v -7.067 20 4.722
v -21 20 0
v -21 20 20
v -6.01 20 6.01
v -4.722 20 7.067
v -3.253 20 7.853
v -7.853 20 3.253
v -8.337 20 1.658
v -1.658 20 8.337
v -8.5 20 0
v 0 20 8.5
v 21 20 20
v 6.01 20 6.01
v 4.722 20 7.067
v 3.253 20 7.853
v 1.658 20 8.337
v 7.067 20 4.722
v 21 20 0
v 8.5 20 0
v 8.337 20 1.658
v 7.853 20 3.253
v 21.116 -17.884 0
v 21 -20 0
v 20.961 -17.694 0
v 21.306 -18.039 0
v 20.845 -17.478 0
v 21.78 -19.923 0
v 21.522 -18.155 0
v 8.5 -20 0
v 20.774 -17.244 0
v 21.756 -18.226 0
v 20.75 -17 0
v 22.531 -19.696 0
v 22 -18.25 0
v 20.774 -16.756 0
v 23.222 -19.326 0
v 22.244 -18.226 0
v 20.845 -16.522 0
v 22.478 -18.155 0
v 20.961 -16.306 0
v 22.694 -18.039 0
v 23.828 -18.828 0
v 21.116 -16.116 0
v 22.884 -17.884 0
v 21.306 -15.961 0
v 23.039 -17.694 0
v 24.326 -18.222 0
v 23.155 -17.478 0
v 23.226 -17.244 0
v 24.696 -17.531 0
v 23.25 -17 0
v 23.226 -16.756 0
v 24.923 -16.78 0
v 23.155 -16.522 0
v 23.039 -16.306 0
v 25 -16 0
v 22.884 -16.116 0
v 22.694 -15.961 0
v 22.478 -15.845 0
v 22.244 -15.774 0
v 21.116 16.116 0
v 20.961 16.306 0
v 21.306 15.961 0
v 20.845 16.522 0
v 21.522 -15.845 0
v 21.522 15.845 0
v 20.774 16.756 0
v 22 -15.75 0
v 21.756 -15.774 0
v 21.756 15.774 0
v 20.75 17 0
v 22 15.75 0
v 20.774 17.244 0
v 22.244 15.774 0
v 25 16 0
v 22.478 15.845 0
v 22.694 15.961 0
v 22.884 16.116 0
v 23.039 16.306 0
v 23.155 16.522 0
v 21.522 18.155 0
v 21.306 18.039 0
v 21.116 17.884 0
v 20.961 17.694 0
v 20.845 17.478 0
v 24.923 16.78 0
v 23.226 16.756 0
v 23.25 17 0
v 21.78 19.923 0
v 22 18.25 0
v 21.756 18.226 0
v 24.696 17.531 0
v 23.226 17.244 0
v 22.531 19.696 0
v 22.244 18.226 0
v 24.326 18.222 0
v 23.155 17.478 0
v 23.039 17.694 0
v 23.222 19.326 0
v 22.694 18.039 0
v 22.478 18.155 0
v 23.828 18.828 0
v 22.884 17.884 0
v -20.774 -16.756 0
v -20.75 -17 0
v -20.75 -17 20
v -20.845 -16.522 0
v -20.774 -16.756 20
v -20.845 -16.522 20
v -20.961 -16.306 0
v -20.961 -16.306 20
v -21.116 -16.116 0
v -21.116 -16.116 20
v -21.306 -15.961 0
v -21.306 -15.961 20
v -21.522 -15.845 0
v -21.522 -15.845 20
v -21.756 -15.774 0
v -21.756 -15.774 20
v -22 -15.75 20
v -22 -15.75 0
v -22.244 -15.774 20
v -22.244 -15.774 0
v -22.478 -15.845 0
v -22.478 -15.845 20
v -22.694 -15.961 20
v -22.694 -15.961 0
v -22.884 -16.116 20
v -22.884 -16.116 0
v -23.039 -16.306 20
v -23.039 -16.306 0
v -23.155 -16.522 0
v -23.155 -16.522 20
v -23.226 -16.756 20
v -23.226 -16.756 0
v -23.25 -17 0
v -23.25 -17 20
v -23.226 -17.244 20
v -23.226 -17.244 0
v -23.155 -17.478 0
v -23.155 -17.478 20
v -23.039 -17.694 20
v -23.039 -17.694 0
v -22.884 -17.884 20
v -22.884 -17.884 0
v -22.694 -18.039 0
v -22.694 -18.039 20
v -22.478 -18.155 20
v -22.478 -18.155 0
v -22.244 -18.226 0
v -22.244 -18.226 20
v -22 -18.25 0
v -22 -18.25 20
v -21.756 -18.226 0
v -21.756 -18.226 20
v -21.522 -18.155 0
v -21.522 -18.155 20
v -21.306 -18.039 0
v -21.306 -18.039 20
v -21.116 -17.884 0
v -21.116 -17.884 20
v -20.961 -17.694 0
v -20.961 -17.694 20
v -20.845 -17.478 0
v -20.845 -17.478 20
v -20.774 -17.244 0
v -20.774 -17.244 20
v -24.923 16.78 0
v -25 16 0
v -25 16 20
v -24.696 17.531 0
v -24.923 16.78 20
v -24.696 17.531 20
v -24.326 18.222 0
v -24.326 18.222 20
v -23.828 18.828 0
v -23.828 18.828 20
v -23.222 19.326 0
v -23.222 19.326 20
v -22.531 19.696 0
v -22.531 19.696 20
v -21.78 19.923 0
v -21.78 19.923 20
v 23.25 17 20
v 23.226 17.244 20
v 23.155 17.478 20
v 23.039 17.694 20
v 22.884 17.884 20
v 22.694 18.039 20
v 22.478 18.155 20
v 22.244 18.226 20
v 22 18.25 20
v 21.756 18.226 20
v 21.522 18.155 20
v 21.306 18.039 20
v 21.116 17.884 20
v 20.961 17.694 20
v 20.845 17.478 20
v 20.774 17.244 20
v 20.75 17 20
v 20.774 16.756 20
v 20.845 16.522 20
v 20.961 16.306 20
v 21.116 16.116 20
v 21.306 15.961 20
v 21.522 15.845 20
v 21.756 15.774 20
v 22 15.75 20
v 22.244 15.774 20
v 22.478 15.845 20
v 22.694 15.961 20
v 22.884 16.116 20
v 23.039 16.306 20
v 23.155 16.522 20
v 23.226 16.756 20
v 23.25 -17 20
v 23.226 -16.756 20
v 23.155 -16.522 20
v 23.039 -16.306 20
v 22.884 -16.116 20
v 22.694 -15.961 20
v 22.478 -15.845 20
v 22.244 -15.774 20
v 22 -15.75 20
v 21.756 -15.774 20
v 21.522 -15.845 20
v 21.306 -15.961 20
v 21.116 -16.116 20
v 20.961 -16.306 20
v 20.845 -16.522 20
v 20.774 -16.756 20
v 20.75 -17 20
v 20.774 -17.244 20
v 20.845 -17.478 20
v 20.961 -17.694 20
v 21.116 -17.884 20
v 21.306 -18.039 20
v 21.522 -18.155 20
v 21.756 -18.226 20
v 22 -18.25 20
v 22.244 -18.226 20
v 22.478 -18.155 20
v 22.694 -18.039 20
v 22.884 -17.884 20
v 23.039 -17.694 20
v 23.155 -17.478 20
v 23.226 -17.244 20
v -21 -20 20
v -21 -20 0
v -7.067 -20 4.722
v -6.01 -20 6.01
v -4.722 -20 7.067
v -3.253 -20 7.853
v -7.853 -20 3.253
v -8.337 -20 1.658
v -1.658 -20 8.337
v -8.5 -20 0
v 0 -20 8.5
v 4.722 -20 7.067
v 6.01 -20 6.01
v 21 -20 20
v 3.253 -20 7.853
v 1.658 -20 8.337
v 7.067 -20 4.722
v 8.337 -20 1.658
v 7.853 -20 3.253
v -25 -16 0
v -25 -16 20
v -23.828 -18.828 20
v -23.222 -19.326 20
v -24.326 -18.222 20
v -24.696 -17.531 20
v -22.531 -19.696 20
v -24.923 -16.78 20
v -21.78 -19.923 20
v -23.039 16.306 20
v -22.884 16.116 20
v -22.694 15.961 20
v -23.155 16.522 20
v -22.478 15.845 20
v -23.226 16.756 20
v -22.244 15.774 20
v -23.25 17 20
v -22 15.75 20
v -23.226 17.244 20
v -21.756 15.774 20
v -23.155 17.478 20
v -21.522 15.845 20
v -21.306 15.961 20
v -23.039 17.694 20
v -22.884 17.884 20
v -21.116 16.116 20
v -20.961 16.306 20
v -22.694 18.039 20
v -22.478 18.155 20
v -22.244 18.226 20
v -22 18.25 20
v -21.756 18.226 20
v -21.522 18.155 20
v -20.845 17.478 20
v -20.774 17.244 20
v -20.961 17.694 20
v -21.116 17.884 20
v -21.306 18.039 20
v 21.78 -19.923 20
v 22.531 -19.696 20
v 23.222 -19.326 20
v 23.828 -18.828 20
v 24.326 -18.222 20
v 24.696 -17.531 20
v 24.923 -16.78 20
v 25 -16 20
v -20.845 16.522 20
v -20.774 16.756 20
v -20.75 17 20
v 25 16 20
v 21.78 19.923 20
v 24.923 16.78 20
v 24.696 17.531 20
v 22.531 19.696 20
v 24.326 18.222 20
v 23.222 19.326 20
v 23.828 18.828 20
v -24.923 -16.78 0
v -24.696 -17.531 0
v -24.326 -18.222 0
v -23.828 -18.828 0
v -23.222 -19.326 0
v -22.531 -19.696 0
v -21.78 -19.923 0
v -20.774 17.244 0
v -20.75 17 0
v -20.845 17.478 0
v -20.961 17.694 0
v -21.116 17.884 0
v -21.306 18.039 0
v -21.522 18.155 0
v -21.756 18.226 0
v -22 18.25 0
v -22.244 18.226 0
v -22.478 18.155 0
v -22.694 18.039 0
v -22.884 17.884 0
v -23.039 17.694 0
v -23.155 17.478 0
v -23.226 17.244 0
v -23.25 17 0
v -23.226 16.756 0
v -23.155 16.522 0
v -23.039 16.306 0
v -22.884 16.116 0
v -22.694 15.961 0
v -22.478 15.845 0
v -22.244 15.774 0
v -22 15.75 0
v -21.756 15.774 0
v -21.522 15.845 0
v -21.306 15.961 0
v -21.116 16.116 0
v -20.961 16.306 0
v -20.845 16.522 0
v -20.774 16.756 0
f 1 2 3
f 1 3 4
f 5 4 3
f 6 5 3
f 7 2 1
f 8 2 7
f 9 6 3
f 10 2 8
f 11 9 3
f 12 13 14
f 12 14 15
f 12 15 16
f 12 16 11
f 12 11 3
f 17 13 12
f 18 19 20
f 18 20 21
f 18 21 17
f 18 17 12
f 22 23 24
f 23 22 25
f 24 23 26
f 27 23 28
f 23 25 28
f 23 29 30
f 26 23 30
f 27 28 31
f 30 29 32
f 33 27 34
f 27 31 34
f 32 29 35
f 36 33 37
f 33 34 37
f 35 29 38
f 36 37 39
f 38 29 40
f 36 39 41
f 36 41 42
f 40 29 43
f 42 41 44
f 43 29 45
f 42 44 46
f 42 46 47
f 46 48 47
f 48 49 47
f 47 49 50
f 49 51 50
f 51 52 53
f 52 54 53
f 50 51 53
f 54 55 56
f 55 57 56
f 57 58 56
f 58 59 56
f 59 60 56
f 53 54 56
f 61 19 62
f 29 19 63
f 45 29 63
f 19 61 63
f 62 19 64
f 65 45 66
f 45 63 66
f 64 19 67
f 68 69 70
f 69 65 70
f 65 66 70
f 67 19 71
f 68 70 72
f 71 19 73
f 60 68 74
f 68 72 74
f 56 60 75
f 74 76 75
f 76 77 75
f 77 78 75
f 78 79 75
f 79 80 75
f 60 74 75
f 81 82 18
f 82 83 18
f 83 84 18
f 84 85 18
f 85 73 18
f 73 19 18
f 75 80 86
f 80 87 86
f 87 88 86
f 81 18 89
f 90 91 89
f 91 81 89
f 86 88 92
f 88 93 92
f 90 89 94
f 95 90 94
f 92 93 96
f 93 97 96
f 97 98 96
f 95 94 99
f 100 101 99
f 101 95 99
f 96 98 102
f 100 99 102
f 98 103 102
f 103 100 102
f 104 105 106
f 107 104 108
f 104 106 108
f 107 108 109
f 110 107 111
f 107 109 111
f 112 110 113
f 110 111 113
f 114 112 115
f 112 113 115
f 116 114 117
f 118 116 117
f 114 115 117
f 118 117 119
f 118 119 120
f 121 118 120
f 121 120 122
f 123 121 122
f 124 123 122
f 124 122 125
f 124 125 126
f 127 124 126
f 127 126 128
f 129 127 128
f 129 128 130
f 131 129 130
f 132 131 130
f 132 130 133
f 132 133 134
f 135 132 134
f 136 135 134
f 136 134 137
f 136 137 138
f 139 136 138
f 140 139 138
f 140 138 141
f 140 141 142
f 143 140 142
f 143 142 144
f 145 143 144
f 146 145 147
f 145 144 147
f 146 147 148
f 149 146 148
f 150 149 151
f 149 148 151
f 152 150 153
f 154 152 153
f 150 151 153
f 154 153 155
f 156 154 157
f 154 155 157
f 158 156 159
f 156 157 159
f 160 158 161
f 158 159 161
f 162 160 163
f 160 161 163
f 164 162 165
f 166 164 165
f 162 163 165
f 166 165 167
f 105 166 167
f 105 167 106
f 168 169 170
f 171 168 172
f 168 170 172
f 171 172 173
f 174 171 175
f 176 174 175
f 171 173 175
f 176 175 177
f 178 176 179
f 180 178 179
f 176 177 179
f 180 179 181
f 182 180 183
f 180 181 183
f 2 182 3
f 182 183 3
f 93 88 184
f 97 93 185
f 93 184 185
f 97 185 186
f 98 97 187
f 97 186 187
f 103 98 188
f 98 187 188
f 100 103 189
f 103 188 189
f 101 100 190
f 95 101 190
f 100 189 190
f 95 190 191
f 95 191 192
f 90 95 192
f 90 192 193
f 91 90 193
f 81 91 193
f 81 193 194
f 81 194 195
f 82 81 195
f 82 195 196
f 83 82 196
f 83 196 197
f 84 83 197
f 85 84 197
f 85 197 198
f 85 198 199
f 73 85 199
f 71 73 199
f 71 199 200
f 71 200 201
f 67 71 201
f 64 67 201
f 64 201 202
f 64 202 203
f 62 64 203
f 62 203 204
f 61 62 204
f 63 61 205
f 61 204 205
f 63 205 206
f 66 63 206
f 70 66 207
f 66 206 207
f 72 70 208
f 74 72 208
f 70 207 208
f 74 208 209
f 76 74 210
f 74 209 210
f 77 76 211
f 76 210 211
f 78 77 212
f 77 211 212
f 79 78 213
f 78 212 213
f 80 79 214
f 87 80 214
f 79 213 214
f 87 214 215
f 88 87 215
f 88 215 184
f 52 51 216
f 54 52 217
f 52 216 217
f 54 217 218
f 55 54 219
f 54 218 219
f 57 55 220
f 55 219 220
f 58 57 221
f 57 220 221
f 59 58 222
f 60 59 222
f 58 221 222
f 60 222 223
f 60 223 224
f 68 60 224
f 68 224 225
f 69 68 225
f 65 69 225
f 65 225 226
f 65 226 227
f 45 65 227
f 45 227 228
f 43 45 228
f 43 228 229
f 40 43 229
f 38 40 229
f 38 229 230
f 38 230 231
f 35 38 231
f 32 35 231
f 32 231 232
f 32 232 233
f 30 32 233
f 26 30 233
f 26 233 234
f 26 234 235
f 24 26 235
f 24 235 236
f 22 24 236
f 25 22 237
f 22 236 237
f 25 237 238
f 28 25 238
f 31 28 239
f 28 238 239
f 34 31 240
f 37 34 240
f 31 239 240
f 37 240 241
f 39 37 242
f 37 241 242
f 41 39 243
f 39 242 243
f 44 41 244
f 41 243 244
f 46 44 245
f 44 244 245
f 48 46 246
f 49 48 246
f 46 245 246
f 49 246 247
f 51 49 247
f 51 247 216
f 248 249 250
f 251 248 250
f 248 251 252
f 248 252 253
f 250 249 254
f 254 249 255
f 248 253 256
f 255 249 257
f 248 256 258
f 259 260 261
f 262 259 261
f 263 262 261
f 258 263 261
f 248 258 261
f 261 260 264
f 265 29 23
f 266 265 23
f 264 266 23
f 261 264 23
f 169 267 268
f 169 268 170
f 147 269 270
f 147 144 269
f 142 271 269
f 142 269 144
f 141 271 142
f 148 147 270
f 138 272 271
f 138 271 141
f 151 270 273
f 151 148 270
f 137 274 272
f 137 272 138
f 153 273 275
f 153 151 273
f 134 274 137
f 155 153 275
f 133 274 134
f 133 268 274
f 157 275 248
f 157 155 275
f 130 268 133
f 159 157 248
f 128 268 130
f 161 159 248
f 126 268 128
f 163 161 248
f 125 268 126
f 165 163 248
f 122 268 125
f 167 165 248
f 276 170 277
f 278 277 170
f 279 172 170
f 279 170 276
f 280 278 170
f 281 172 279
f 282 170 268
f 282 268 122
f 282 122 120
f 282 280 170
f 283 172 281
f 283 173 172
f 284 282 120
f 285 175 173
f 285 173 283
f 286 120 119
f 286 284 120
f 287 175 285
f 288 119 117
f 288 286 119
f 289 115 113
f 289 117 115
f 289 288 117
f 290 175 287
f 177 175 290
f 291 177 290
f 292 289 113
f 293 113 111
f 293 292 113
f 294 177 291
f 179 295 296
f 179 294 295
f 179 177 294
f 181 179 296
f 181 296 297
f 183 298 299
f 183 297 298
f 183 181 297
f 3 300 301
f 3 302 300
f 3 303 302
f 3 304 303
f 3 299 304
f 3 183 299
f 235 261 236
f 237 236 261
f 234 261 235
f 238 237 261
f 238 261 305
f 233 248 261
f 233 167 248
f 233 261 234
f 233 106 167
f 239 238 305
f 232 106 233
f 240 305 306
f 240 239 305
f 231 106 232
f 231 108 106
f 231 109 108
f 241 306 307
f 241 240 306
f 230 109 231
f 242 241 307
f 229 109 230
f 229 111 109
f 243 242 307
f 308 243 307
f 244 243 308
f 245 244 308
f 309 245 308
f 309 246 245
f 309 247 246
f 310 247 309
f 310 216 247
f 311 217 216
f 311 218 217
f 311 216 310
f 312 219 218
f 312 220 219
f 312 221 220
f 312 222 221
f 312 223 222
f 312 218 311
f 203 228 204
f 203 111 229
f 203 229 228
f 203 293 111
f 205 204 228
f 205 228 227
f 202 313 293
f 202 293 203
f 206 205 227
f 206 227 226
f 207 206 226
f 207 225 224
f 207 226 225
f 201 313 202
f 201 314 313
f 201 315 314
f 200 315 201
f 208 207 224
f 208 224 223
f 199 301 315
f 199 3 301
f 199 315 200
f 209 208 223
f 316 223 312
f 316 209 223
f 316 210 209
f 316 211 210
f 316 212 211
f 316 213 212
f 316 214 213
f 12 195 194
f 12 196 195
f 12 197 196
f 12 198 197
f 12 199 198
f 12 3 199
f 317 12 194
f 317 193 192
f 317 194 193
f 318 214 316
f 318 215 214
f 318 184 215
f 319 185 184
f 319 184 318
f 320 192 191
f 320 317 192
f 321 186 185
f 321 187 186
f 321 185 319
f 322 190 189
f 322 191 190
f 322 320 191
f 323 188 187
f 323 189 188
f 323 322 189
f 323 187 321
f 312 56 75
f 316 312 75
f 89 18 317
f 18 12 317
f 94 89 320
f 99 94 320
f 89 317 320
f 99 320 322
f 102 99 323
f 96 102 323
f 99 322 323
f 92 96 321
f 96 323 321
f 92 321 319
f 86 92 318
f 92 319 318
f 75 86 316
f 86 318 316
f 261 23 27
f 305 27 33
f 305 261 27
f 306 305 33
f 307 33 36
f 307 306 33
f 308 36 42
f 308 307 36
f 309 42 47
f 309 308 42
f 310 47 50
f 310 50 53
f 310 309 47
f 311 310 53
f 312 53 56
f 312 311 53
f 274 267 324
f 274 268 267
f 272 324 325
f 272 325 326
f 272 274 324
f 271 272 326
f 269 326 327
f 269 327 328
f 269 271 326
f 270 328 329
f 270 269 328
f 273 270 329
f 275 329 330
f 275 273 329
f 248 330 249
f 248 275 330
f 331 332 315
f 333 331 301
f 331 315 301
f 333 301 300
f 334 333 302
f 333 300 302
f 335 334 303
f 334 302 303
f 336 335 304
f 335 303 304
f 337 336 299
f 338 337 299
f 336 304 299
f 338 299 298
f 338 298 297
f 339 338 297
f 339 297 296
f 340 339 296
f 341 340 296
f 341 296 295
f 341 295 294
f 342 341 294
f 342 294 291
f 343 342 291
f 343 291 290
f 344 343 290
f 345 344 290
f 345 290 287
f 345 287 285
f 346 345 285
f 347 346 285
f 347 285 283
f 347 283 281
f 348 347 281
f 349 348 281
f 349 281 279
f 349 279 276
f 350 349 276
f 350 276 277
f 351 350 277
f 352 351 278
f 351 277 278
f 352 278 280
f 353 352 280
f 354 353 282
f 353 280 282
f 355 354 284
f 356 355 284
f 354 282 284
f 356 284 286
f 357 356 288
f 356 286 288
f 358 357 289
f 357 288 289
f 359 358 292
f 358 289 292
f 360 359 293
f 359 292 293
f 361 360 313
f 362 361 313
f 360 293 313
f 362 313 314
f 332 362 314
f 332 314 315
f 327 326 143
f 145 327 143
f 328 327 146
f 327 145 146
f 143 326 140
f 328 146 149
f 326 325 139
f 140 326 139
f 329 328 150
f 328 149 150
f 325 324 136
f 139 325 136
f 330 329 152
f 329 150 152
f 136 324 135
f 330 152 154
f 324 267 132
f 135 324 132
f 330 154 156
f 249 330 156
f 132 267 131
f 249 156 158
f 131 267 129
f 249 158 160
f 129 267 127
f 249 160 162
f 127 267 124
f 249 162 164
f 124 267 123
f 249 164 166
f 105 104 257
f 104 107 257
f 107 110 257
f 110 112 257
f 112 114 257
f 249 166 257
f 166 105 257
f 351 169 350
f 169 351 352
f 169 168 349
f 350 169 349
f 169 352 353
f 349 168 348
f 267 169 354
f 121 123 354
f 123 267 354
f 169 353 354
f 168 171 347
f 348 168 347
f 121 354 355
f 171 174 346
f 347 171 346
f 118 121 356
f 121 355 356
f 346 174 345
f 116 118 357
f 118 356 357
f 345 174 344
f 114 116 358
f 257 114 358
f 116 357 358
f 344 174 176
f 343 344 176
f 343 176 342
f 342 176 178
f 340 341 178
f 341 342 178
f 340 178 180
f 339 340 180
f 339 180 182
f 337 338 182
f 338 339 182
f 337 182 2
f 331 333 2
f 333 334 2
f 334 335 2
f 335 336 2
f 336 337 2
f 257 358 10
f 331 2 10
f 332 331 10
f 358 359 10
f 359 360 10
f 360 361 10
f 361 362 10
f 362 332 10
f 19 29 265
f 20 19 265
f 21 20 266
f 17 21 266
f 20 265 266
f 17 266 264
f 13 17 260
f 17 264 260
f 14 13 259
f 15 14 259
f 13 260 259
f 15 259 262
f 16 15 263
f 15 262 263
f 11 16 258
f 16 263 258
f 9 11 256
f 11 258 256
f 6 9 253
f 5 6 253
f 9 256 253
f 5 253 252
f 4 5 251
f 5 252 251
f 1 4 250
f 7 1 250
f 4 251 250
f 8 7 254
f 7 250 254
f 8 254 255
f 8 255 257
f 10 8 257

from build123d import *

# Parameters (mm, degrees)
SKETCH_W        = 50
SKETCH_H        = 40
PAD_DEPTH       = 20
SKETCH001_R     = 8.5
POCKET_DEPTH    = 40.001
SKETCH002_R     = 1.25
POCKET001_DEPTH = 20.001
FILLET_R        = 4


with BuildPart() as part:
    # Sketch → Pad (new body)
    with BuildSketch(Plane.XY):
        Rectangle(SKETCH_W, SKETCH_H)
    extrude(amount=PAD_DEPTH)

    # Sketch001 (on Face2 of Pad) → Pocket (cut, through all)
    with BuildSketch(Plane.XZ.offset(20)):
        Circle(SKETCH001_R)
    extrude(amount=-POCKET_DEPTH, mode=Mode.SUBTRACT)

    # Sketch002 (on Face5 of Pocket) → Pocket001 (cut, through all)
    with BuildSketch(Plane.XY.offset(20)):
        with Locations((-22, 17)):
            Circle(SKETCH002_R)
        with Locations((22, 17)):
            Circle(SKETCH002_R)
        with Locations((22, -17)):
            Circle(SKETCH002_R)
        with Locations((-22, -17)):
            Circle(SKETCH002_R)
    extrude(amount=-POCKET001_DEPTH, mode=Mode.SUBTRACT)

    # Fillet
    fillet_edges = [part.edges().sort_by_distance(p)[0] for p in [
        (-25, -20, 10),
        (-25, 20, 10),
        (25, 20, 10),
        (25, -20, 10),
    ]]
    fillet(fillet_edges, radius=FILLET_R)


solid = part.part
